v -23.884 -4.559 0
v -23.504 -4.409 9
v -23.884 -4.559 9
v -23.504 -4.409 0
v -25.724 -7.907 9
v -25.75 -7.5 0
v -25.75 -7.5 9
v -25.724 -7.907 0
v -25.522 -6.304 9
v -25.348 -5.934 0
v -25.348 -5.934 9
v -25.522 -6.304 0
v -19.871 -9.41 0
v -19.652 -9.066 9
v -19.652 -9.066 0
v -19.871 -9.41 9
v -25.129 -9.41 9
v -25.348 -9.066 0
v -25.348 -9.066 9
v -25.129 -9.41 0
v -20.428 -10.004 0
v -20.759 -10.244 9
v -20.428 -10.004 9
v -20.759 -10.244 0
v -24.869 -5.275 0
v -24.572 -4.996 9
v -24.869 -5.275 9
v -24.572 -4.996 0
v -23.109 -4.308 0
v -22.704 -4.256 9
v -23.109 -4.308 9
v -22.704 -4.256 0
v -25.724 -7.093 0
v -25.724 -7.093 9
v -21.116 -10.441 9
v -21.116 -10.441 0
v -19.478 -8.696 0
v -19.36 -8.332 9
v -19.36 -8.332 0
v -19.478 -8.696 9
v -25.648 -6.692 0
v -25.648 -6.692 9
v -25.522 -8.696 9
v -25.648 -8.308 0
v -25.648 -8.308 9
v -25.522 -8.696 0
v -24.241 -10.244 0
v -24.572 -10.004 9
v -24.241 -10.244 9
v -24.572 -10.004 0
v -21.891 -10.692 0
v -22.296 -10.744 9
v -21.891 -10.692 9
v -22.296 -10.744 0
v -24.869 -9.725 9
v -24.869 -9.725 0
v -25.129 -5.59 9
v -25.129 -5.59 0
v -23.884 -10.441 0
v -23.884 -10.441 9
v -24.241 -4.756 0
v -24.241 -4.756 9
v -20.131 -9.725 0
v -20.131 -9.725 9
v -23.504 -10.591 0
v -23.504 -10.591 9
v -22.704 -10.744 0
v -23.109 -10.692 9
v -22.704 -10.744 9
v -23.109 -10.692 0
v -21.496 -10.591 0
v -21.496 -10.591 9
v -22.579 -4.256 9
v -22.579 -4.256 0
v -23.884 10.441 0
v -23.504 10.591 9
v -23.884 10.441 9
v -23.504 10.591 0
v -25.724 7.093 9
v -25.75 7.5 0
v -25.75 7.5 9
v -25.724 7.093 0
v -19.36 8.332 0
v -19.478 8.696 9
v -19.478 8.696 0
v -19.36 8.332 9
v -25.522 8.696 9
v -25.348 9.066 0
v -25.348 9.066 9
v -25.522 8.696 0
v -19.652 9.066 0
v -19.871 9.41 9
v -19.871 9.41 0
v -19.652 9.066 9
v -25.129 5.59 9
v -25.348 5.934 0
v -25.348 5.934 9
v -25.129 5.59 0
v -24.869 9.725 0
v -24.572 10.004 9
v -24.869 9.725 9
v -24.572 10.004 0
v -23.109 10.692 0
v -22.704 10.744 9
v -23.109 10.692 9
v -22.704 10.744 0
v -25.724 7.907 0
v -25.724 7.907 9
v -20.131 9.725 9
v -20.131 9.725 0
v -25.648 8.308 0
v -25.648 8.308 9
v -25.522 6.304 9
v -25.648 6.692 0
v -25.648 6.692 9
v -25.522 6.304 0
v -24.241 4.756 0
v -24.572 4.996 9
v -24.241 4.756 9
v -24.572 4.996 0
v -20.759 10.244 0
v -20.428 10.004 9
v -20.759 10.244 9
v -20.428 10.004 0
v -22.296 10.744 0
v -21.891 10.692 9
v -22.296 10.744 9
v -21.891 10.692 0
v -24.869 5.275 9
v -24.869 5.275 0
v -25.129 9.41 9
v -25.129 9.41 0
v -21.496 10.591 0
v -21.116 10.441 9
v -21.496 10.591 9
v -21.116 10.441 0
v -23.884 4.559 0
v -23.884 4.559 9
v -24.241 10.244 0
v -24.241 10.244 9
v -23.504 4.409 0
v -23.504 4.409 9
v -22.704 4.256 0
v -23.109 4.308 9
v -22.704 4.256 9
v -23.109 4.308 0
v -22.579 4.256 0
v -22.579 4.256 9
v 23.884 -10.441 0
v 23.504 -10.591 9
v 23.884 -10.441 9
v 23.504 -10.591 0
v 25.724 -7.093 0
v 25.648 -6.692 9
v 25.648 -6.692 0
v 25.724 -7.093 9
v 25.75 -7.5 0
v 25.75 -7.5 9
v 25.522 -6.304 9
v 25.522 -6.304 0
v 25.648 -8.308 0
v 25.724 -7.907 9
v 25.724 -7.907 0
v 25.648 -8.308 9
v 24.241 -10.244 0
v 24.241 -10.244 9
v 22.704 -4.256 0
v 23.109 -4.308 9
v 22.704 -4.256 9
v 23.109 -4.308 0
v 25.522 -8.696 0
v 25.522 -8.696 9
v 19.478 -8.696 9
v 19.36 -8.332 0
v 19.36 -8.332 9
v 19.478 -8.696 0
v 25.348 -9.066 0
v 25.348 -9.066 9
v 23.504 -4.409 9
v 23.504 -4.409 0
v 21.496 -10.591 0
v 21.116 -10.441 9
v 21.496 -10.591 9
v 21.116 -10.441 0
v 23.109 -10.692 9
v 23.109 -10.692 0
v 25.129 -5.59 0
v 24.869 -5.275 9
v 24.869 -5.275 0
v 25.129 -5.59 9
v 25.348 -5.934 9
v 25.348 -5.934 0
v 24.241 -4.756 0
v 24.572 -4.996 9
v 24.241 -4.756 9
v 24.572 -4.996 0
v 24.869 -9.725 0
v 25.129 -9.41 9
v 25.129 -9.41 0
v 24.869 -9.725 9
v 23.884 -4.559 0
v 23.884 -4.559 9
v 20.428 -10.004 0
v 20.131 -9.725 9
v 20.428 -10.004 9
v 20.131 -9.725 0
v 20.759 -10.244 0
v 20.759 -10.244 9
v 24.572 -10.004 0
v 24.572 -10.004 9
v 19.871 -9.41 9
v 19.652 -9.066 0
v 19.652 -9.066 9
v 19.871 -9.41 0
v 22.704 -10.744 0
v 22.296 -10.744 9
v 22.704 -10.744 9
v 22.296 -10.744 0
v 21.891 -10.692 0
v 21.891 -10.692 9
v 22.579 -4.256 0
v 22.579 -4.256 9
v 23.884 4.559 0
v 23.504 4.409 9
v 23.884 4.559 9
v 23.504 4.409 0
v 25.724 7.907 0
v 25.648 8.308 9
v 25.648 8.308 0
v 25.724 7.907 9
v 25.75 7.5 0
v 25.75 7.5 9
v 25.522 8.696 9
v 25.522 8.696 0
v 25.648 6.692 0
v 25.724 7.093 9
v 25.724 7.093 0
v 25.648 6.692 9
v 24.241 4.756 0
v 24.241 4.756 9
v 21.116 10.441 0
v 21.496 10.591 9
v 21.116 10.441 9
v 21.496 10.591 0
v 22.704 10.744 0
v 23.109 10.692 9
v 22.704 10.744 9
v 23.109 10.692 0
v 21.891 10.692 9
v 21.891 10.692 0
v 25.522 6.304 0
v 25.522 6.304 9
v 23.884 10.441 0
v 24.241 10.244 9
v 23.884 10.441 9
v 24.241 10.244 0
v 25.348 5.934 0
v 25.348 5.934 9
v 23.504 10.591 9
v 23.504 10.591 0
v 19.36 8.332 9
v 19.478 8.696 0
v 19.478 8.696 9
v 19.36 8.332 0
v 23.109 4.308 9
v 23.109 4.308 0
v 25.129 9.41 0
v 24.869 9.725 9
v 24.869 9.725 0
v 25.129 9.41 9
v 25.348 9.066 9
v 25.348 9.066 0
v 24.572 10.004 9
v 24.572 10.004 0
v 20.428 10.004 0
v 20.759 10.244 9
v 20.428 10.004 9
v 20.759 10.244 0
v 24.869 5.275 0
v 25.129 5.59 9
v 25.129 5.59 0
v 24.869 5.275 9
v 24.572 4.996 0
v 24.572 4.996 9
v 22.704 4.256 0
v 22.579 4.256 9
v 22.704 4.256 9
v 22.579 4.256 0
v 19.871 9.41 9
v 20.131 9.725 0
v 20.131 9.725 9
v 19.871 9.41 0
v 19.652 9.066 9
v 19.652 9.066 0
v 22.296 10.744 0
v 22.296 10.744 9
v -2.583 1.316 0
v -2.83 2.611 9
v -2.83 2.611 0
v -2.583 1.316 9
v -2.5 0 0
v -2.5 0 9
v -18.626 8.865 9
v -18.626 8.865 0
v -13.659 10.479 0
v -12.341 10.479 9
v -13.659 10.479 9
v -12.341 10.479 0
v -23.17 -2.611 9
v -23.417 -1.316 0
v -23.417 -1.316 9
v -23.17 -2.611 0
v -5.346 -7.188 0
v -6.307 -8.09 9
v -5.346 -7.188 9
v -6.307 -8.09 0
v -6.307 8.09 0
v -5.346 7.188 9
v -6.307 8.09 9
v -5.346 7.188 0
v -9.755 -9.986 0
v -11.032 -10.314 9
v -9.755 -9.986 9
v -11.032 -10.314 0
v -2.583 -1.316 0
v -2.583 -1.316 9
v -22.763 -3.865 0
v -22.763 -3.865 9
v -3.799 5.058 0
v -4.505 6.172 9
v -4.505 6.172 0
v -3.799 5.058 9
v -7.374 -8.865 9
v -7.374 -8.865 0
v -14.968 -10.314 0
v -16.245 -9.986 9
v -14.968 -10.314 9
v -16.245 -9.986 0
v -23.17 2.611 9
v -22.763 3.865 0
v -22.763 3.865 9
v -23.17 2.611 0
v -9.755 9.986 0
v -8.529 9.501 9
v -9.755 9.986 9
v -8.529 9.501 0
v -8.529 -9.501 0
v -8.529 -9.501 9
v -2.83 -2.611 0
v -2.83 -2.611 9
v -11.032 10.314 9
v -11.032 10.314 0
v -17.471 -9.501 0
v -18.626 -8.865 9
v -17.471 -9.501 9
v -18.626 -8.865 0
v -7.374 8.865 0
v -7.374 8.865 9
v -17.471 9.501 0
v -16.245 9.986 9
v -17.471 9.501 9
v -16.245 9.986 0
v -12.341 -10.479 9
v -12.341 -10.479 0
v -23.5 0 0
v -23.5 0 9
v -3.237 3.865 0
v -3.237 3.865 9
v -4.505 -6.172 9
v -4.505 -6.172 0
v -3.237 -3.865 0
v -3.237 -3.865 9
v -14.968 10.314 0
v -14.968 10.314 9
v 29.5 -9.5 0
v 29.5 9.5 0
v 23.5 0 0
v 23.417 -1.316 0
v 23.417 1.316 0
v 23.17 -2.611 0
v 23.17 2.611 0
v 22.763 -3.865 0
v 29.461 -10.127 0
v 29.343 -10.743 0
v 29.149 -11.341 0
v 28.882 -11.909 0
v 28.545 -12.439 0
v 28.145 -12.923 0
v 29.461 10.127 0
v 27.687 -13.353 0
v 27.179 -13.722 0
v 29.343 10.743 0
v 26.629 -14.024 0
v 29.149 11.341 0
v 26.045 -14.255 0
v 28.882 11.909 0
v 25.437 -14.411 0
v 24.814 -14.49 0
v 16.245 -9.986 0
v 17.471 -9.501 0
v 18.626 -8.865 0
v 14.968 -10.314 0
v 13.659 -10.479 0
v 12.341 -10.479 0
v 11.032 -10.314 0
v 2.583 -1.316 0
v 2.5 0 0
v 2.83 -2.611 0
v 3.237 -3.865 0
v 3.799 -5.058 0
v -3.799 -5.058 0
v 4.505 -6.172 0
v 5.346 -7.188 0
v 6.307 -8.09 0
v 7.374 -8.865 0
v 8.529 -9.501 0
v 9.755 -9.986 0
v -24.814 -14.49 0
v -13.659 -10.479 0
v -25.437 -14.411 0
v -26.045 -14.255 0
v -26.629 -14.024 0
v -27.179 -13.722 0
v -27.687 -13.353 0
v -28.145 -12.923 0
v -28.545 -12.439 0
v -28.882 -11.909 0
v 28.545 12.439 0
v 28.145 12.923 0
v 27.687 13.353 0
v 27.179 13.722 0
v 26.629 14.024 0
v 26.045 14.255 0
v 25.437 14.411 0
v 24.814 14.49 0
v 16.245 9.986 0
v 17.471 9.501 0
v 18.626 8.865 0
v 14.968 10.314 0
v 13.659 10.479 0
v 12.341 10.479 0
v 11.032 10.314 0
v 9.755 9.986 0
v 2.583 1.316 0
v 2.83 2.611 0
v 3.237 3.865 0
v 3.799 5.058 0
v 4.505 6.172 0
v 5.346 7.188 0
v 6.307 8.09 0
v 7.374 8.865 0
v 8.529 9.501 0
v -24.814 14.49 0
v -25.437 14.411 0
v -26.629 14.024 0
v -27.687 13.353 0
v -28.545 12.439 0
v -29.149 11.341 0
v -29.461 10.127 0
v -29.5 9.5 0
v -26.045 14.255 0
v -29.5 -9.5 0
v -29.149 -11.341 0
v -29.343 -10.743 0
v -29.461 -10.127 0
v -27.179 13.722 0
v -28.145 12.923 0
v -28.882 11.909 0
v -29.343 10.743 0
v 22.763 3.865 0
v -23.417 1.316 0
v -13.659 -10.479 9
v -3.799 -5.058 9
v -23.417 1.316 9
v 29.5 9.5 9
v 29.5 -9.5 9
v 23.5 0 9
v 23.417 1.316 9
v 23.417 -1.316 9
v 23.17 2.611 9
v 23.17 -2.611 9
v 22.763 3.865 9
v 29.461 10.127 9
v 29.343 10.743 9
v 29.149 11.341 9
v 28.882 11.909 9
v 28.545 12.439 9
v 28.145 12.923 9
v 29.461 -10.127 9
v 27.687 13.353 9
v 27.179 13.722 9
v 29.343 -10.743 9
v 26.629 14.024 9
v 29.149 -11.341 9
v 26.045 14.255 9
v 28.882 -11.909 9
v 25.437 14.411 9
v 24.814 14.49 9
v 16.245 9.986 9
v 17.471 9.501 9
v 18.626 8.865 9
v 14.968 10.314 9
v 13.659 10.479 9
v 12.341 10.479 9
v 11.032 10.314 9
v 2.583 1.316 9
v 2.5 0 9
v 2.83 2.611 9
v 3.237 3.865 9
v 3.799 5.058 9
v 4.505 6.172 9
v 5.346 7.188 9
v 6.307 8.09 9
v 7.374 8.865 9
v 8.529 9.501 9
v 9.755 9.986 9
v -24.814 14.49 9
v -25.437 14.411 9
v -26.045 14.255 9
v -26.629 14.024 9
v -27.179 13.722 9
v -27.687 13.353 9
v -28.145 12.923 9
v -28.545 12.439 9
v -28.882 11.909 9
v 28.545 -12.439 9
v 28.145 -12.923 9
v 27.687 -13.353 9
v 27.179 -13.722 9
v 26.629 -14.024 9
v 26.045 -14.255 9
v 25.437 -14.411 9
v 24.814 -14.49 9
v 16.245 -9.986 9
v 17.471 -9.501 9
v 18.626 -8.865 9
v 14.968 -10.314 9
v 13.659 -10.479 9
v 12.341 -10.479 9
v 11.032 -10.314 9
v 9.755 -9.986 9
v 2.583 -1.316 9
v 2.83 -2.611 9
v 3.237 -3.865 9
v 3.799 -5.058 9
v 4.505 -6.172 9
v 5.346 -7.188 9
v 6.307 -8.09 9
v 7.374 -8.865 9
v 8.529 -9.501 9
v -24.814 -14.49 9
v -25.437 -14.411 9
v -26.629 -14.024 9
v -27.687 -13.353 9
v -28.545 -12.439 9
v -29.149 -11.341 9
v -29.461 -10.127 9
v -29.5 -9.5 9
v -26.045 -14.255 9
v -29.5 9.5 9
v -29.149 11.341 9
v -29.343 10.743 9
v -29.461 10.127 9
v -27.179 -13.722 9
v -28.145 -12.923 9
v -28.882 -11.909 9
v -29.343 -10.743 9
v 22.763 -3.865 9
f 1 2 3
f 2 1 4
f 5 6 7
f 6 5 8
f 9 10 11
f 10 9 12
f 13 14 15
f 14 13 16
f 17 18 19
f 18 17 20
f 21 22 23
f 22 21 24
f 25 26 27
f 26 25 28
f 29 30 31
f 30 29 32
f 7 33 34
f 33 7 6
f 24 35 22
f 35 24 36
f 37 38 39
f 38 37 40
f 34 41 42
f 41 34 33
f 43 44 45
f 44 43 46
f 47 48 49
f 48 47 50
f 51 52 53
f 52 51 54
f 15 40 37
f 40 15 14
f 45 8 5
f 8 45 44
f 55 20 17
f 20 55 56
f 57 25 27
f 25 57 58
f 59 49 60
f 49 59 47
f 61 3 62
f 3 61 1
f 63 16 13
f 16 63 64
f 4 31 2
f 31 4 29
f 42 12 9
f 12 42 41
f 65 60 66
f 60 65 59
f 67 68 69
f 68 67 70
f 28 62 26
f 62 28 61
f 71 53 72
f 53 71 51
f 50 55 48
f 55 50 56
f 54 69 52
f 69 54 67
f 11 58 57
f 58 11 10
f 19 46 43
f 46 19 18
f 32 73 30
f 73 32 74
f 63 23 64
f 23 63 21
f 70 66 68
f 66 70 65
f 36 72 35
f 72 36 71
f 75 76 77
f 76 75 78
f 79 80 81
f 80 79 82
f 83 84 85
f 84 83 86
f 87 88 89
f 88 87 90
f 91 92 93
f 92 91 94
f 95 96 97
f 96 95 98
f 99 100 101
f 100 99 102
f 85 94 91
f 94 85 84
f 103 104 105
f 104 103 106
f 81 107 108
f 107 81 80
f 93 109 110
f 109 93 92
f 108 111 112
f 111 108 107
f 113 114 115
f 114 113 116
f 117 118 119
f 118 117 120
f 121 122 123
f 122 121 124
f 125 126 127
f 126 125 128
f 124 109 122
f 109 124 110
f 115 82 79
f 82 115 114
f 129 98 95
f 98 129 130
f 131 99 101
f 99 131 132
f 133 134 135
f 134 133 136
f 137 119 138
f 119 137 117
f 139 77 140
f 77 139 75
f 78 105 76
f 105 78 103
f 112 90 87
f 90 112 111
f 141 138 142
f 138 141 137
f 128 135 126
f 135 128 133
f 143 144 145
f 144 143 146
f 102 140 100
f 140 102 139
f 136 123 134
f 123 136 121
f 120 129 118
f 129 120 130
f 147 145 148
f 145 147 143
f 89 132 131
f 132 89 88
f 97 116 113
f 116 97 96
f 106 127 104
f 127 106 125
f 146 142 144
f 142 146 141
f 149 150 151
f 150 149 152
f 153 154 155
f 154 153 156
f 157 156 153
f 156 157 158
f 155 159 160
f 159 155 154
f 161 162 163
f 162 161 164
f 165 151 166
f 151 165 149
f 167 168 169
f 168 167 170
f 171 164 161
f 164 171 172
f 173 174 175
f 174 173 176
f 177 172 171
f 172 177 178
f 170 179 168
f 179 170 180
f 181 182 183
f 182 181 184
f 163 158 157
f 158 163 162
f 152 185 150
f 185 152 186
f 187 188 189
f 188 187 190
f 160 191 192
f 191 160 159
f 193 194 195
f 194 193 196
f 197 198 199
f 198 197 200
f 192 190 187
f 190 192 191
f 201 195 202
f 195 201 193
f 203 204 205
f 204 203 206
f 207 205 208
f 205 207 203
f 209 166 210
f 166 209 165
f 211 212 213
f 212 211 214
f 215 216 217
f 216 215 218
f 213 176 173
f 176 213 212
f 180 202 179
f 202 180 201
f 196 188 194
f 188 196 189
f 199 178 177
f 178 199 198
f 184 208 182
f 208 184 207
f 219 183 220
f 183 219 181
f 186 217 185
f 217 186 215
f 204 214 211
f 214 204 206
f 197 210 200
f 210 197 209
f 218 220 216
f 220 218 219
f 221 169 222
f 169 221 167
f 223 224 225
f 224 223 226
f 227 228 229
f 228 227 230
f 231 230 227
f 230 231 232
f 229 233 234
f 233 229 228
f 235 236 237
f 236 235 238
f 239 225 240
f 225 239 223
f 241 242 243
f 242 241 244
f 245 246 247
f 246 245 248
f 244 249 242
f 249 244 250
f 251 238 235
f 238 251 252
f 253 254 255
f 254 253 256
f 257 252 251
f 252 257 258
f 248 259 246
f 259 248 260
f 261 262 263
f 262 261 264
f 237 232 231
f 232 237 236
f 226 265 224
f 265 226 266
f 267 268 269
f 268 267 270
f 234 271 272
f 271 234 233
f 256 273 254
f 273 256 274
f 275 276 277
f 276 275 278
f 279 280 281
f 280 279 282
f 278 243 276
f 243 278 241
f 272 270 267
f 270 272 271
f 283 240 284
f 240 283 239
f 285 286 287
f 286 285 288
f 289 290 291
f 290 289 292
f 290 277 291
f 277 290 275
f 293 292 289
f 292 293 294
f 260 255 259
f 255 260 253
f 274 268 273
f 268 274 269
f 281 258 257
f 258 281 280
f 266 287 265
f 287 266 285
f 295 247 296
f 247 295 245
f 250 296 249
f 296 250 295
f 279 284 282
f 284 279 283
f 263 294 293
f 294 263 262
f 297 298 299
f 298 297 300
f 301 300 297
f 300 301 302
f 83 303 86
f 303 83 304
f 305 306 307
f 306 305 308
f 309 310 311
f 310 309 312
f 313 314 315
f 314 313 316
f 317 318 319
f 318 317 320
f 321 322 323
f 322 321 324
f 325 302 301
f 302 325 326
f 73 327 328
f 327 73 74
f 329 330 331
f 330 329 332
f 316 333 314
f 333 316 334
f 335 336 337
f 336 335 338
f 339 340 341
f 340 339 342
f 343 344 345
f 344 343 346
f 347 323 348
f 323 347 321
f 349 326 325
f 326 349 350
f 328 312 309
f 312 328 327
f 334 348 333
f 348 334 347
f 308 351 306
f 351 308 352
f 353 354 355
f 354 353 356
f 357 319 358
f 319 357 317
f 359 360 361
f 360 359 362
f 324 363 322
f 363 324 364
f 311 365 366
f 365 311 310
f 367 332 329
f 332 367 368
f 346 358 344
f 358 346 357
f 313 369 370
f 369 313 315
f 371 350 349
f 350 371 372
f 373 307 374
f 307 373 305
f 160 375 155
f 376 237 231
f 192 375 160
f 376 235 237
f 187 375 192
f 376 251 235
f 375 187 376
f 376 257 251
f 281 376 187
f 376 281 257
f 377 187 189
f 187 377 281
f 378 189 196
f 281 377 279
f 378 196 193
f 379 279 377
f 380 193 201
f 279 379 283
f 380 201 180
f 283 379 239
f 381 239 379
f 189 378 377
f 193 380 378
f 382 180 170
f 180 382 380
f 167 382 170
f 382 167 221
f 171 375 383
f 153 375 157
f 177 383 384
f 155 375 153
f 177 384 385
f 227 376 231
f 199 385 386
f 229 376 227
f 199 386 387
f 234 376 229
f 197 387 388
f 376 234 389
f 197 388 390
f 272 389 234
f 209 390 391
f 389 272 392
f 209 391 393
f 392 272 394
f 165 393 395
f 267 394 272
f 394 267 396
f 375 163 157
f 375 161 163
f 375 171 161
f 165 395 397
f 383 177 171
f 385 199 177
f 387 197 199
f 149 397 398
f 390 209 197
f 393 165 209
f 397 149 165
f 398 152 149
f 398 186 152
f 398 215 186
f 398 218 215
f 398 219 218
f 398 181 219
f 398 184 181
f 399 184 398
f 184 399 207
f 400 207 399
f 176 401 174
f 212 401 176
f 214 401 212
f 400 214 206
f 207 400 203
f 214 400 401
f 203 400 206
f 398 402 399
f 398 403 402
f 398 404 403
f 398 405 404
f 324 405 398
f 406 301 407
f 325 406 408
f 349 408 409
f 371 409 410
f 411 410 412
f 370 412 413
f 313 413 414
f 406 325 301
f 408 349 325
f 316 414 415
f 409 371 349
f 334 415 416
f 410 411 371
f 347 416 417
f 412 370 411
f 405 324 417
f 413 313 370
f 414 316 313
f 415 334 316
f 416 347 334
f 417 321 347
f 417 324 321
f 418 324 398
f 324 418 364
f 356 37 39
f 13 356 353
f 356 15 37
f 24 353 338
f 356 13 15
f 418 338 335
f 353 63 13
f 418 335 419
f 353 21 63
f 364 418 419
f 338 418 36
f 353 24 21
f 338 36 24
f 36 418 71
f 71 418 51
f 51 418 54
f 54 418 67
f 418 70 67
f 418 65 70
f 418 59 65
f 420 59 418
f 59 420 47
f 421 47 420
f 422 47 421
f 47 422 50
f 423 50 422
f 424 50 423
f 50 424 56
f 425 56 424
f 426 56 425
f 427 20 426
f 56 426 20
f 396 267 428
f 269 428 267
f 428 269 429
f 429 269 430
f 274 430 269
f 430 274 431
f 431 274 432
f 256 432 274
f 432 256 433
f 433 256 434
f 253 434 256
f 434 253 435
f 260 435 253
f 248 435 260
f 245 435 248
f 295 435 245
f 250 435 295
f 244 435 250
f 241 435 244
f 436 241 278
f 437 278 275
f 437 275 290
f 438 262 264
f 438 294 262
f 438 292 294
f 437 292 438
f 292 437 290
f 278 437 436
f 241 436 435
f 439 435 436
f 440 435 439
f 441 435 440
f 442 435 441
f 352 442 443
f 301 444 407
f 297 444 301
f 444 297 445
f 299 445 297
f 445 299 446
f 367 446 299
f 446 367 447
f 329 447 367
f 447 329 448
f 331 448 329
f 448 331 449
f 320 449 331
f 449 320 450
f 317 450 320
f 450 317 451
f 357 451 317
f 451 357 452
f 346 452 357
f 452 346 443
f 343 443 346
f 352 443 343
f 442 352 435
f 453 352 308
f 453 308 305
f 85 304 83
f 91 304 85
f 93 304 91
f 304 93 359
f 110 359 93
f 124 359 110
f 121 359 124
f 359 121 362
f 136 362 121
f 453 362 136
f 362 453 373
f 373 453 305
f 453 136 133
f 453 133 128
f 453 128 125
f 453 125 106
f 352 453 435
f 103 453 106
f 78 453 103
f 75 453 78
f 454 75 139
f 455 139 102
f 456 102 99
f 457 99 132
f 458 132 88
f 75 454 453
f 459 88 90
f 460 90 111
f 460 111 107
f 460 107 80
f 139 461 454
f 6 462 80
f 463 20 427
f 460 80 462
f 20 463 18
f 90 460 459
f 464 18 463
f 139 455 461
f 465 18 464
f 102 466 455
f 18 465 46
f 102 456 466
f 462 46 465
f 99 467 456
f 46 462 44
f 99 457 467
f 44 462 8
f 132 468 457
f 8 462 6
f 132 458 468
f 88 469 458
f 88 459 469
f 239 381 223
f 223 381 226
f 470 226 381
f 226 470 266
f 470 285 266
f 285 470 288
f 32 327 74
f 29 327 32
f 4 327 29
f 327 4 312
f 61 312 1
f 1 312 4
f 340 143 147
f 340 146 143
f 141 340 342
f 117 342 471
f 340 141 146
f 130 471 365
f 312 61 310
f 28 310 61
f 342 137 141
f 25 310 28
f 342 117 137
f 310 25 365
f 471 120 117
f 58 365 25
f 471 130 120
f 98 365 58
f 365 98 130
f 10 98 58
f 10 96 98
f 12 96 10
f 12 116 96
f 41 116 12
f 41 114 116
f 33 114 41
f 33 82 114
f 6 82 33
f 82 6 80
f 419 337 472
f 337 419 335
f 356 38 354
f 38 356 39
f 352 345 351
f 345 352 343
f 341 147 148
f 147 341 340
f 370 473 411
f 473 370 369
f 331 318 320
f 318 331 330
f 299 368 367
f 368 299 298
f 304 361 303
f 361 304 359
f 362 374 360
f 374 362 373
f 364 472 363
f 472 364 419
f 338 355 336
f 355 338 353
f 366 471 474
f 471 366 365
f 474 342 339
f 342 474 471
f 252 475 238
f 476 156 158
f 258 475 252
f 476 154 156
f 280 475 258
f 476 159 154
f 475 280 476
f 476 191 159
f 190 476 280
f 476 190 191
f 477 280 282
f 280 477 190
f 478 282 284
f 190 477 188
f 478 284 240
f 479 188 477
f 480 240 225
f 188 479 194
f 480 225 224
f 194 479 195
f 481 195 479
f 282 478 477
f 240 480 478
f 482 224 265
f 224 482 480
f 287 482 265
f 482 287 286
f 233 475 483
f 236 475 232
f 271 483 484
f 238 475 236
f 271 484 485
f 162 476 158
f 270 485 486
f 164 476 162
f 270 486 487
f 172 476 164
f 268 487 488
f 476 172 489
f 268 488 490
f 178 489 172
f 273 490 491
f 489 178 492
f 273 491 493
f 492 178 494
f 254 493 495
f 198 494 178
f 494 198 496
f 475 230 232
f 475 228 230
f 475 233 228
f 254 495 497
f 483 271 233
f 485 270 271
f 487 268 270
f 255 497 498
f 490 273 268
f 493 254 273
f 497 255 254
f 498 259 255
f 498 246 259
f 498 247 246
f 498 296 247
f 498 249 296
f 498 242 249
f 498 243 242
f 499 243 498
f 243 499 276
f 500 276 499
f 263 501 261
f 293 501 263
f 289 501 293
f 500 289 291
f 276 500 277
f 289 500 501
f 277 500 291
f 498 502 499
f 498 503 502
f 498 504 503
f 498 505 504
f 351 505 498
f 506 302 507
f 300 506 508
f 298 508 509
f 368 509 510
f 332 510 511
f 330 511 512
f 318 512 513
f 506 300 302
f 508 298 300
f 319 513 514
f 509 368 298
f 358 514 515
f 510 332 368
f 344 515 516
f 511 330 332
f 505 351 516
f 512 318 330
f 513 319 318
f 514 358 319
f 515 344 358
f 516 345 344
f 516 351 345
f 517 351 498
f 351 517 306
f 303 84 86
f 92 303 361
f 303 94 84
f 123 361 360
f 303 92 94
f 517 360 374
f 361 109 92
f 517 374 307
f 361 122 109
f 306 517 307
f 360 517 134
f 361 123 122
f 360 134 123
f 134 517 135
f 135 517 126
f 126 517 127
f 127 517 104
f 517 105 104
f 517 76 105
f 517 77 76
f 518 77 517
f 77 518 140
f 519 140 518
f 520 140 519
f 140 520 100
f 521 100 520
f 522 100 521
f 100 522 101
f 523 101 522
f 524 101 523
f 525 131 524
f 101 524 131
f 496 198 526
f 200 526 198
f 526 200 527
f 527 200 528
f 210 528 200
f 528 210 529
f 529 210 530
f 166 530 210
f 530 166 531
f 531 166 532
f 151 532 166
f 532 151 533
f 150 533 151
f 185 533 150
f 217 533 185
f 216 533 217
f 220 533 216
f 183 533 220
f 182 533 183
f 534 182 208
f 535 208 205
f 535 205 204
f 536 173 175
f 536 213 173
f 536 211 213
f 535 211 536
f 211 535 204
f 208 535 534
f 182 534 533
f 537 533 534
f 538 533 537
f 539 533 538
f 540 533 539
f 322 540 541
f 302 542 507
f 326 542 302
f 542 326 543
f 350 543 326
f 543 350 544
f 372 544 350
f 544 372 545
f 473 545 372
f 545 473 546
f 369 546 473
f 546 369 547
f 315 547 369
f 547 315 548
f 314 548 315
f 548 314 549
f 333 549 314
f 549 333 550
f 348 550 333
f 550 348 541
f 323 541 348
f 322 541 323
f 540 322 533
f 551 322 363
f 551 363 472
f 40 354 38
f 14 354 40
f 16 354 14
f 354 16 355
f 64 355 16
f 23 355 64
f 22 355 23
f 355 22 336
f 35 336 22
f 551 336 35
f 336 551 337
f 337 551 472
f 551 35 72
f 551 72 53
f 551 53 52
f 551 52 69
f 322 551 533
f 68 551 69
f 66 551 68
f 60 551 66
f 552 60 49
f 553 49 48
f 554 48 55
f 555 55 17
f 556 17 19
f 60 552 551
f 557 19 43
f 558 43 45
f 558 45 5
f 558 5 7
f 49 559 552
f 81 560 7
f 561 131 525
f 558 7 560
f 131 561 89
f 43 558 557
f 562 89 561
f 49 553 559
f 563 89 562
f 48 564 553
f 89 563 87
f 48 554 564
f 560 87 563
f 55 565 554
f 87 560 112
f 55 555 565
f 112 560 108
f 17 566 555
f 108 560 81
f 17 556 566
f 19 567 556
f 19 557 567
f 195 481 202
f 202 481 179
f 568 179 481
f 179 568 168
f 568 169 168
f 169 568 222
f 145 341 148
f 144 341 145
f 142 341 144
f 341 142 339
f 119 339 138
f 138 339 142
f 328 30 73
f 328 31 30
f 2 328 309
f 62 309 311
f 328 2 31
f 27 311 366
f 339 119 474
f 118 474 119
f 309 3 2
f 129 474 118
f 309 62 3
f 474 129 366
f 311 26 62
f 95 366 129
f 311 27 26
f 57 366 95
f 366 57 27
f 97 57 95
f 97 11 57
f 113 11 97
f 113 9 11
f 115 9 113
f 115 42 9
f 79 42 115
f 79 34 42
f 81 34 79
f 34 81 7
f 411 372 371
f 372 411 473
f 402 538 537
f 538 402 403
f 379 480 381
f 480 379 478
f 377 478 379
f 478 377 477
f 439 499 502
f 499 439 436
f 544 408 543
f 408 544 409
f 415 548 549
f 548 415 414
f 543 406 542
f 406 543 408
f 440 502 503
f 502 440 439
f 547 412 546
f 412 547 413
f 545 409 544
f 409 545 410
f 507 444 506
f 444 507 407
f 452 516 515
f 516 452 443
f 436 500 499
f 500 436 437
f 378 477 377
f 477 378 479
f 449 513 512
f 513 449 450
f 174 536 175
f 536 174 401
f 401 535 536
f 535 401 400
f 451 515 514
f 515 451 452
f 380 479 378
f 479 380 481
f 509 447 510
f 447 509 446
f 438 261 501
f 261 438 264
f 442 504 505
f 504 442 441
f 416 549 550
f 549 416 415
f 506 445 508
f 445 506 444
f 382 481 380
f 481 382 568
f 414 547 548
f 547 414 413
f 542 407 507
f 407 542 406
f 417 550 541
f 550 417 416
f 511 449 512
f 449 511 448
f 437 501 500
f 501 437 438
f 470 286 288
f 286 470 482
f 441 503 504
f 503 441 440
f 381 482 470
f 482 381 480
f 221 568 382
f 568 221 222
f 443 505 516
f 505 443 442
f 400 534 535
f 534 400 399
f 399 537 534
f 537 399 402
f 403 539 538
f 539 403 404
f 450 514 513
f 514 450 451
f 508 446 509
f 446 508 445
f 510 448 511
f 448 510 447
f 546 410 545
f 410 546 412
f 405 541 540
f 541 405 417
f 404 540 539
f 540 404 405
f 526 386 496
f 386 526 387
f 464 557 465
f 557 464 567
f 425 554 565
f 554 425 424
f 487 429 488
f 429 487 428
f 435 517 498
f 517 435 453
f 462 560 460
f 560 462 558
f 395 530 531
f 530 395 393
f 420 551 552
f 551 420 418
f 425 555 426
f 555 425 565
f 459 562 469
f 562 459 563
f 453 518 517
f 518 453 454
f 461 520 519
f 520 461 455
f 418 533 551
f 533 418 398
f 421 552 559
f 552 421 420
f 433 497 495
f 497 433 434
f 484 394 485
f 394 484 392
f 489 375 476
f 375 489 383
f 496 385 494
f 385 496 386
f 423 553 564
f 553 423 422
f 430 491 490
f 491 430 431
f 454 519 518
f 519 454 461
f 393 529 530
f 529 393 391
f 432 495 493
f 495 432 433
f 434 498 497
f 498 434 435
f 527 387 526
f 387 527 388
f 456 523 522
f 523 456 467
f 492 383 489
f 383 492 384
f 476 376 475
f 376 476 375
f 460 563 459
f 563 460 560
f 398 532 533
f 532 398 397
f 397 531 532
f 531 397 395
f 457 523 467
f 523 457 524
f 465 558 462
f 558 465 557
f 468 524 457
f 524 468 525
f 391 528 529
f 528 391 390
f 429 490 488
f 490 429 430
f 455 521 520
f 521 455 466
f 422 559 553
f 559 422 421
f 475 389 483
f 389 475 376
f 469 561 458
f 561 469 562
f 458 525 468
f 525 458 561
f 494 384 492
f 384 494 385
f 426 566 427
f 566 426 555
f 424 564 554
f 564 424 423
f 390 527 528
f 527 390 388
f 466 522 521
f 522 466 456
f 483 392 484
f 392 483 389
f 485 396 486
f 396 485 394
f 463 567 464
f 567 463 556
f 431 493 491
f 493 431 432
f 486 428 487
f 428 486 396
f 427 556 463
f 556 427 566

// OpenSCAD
$fn = 50;


difference() {
	union() {
		hull() {
			translate(v = [-24.5000000000, 9.5000000000, 0]) {
				cylinder(h = 9, r = 5);
			}
			translate(v = [24.5000000000, 9.5000000000, 0]) {
				cylinder(h = 9, r = 5);
			}
			translate(v = [-24.5000000000, -9.5000000000, 0]) {
				cylinder(h = 9, r = 5);
			}
			translate(v = [24.5000000000, -9.5000000000, 0]) {
				cylinder(h = 9, r = 5);
			}
		}
	}
	union() {
		#translate(v = [-22.5000000000, -7.5000000000, -100.0000000000]) {
			cylinder(h = 200, r = 3.2500000000);
		}
		#translate(v = [-22.5000000000, 7.5000000000, -100.0000000000]) {
			cylinder(h = 200, r = 3.2500000000);
		}
		#translate(v = [22.5000000000, -7.5000000000, -100.0000000000]) {
			cylinder(h = 200, r = 3.2500000000);
		}
		#translate(v = [22.5000000000, 7.5000000000, -100.0000000000]) {
			cylinder(h = 200, r = 3.2500000000);
		}
		#translate(v = [-13.0000000000, 0, 0]) {
			cylinder(h = 9, r = 10.5000000000);
		}
		#translate(v = [13.0000000000, 0, 0]) {
			cylinder(h = 9, r = 10.5000000000);
		}
	}
}
